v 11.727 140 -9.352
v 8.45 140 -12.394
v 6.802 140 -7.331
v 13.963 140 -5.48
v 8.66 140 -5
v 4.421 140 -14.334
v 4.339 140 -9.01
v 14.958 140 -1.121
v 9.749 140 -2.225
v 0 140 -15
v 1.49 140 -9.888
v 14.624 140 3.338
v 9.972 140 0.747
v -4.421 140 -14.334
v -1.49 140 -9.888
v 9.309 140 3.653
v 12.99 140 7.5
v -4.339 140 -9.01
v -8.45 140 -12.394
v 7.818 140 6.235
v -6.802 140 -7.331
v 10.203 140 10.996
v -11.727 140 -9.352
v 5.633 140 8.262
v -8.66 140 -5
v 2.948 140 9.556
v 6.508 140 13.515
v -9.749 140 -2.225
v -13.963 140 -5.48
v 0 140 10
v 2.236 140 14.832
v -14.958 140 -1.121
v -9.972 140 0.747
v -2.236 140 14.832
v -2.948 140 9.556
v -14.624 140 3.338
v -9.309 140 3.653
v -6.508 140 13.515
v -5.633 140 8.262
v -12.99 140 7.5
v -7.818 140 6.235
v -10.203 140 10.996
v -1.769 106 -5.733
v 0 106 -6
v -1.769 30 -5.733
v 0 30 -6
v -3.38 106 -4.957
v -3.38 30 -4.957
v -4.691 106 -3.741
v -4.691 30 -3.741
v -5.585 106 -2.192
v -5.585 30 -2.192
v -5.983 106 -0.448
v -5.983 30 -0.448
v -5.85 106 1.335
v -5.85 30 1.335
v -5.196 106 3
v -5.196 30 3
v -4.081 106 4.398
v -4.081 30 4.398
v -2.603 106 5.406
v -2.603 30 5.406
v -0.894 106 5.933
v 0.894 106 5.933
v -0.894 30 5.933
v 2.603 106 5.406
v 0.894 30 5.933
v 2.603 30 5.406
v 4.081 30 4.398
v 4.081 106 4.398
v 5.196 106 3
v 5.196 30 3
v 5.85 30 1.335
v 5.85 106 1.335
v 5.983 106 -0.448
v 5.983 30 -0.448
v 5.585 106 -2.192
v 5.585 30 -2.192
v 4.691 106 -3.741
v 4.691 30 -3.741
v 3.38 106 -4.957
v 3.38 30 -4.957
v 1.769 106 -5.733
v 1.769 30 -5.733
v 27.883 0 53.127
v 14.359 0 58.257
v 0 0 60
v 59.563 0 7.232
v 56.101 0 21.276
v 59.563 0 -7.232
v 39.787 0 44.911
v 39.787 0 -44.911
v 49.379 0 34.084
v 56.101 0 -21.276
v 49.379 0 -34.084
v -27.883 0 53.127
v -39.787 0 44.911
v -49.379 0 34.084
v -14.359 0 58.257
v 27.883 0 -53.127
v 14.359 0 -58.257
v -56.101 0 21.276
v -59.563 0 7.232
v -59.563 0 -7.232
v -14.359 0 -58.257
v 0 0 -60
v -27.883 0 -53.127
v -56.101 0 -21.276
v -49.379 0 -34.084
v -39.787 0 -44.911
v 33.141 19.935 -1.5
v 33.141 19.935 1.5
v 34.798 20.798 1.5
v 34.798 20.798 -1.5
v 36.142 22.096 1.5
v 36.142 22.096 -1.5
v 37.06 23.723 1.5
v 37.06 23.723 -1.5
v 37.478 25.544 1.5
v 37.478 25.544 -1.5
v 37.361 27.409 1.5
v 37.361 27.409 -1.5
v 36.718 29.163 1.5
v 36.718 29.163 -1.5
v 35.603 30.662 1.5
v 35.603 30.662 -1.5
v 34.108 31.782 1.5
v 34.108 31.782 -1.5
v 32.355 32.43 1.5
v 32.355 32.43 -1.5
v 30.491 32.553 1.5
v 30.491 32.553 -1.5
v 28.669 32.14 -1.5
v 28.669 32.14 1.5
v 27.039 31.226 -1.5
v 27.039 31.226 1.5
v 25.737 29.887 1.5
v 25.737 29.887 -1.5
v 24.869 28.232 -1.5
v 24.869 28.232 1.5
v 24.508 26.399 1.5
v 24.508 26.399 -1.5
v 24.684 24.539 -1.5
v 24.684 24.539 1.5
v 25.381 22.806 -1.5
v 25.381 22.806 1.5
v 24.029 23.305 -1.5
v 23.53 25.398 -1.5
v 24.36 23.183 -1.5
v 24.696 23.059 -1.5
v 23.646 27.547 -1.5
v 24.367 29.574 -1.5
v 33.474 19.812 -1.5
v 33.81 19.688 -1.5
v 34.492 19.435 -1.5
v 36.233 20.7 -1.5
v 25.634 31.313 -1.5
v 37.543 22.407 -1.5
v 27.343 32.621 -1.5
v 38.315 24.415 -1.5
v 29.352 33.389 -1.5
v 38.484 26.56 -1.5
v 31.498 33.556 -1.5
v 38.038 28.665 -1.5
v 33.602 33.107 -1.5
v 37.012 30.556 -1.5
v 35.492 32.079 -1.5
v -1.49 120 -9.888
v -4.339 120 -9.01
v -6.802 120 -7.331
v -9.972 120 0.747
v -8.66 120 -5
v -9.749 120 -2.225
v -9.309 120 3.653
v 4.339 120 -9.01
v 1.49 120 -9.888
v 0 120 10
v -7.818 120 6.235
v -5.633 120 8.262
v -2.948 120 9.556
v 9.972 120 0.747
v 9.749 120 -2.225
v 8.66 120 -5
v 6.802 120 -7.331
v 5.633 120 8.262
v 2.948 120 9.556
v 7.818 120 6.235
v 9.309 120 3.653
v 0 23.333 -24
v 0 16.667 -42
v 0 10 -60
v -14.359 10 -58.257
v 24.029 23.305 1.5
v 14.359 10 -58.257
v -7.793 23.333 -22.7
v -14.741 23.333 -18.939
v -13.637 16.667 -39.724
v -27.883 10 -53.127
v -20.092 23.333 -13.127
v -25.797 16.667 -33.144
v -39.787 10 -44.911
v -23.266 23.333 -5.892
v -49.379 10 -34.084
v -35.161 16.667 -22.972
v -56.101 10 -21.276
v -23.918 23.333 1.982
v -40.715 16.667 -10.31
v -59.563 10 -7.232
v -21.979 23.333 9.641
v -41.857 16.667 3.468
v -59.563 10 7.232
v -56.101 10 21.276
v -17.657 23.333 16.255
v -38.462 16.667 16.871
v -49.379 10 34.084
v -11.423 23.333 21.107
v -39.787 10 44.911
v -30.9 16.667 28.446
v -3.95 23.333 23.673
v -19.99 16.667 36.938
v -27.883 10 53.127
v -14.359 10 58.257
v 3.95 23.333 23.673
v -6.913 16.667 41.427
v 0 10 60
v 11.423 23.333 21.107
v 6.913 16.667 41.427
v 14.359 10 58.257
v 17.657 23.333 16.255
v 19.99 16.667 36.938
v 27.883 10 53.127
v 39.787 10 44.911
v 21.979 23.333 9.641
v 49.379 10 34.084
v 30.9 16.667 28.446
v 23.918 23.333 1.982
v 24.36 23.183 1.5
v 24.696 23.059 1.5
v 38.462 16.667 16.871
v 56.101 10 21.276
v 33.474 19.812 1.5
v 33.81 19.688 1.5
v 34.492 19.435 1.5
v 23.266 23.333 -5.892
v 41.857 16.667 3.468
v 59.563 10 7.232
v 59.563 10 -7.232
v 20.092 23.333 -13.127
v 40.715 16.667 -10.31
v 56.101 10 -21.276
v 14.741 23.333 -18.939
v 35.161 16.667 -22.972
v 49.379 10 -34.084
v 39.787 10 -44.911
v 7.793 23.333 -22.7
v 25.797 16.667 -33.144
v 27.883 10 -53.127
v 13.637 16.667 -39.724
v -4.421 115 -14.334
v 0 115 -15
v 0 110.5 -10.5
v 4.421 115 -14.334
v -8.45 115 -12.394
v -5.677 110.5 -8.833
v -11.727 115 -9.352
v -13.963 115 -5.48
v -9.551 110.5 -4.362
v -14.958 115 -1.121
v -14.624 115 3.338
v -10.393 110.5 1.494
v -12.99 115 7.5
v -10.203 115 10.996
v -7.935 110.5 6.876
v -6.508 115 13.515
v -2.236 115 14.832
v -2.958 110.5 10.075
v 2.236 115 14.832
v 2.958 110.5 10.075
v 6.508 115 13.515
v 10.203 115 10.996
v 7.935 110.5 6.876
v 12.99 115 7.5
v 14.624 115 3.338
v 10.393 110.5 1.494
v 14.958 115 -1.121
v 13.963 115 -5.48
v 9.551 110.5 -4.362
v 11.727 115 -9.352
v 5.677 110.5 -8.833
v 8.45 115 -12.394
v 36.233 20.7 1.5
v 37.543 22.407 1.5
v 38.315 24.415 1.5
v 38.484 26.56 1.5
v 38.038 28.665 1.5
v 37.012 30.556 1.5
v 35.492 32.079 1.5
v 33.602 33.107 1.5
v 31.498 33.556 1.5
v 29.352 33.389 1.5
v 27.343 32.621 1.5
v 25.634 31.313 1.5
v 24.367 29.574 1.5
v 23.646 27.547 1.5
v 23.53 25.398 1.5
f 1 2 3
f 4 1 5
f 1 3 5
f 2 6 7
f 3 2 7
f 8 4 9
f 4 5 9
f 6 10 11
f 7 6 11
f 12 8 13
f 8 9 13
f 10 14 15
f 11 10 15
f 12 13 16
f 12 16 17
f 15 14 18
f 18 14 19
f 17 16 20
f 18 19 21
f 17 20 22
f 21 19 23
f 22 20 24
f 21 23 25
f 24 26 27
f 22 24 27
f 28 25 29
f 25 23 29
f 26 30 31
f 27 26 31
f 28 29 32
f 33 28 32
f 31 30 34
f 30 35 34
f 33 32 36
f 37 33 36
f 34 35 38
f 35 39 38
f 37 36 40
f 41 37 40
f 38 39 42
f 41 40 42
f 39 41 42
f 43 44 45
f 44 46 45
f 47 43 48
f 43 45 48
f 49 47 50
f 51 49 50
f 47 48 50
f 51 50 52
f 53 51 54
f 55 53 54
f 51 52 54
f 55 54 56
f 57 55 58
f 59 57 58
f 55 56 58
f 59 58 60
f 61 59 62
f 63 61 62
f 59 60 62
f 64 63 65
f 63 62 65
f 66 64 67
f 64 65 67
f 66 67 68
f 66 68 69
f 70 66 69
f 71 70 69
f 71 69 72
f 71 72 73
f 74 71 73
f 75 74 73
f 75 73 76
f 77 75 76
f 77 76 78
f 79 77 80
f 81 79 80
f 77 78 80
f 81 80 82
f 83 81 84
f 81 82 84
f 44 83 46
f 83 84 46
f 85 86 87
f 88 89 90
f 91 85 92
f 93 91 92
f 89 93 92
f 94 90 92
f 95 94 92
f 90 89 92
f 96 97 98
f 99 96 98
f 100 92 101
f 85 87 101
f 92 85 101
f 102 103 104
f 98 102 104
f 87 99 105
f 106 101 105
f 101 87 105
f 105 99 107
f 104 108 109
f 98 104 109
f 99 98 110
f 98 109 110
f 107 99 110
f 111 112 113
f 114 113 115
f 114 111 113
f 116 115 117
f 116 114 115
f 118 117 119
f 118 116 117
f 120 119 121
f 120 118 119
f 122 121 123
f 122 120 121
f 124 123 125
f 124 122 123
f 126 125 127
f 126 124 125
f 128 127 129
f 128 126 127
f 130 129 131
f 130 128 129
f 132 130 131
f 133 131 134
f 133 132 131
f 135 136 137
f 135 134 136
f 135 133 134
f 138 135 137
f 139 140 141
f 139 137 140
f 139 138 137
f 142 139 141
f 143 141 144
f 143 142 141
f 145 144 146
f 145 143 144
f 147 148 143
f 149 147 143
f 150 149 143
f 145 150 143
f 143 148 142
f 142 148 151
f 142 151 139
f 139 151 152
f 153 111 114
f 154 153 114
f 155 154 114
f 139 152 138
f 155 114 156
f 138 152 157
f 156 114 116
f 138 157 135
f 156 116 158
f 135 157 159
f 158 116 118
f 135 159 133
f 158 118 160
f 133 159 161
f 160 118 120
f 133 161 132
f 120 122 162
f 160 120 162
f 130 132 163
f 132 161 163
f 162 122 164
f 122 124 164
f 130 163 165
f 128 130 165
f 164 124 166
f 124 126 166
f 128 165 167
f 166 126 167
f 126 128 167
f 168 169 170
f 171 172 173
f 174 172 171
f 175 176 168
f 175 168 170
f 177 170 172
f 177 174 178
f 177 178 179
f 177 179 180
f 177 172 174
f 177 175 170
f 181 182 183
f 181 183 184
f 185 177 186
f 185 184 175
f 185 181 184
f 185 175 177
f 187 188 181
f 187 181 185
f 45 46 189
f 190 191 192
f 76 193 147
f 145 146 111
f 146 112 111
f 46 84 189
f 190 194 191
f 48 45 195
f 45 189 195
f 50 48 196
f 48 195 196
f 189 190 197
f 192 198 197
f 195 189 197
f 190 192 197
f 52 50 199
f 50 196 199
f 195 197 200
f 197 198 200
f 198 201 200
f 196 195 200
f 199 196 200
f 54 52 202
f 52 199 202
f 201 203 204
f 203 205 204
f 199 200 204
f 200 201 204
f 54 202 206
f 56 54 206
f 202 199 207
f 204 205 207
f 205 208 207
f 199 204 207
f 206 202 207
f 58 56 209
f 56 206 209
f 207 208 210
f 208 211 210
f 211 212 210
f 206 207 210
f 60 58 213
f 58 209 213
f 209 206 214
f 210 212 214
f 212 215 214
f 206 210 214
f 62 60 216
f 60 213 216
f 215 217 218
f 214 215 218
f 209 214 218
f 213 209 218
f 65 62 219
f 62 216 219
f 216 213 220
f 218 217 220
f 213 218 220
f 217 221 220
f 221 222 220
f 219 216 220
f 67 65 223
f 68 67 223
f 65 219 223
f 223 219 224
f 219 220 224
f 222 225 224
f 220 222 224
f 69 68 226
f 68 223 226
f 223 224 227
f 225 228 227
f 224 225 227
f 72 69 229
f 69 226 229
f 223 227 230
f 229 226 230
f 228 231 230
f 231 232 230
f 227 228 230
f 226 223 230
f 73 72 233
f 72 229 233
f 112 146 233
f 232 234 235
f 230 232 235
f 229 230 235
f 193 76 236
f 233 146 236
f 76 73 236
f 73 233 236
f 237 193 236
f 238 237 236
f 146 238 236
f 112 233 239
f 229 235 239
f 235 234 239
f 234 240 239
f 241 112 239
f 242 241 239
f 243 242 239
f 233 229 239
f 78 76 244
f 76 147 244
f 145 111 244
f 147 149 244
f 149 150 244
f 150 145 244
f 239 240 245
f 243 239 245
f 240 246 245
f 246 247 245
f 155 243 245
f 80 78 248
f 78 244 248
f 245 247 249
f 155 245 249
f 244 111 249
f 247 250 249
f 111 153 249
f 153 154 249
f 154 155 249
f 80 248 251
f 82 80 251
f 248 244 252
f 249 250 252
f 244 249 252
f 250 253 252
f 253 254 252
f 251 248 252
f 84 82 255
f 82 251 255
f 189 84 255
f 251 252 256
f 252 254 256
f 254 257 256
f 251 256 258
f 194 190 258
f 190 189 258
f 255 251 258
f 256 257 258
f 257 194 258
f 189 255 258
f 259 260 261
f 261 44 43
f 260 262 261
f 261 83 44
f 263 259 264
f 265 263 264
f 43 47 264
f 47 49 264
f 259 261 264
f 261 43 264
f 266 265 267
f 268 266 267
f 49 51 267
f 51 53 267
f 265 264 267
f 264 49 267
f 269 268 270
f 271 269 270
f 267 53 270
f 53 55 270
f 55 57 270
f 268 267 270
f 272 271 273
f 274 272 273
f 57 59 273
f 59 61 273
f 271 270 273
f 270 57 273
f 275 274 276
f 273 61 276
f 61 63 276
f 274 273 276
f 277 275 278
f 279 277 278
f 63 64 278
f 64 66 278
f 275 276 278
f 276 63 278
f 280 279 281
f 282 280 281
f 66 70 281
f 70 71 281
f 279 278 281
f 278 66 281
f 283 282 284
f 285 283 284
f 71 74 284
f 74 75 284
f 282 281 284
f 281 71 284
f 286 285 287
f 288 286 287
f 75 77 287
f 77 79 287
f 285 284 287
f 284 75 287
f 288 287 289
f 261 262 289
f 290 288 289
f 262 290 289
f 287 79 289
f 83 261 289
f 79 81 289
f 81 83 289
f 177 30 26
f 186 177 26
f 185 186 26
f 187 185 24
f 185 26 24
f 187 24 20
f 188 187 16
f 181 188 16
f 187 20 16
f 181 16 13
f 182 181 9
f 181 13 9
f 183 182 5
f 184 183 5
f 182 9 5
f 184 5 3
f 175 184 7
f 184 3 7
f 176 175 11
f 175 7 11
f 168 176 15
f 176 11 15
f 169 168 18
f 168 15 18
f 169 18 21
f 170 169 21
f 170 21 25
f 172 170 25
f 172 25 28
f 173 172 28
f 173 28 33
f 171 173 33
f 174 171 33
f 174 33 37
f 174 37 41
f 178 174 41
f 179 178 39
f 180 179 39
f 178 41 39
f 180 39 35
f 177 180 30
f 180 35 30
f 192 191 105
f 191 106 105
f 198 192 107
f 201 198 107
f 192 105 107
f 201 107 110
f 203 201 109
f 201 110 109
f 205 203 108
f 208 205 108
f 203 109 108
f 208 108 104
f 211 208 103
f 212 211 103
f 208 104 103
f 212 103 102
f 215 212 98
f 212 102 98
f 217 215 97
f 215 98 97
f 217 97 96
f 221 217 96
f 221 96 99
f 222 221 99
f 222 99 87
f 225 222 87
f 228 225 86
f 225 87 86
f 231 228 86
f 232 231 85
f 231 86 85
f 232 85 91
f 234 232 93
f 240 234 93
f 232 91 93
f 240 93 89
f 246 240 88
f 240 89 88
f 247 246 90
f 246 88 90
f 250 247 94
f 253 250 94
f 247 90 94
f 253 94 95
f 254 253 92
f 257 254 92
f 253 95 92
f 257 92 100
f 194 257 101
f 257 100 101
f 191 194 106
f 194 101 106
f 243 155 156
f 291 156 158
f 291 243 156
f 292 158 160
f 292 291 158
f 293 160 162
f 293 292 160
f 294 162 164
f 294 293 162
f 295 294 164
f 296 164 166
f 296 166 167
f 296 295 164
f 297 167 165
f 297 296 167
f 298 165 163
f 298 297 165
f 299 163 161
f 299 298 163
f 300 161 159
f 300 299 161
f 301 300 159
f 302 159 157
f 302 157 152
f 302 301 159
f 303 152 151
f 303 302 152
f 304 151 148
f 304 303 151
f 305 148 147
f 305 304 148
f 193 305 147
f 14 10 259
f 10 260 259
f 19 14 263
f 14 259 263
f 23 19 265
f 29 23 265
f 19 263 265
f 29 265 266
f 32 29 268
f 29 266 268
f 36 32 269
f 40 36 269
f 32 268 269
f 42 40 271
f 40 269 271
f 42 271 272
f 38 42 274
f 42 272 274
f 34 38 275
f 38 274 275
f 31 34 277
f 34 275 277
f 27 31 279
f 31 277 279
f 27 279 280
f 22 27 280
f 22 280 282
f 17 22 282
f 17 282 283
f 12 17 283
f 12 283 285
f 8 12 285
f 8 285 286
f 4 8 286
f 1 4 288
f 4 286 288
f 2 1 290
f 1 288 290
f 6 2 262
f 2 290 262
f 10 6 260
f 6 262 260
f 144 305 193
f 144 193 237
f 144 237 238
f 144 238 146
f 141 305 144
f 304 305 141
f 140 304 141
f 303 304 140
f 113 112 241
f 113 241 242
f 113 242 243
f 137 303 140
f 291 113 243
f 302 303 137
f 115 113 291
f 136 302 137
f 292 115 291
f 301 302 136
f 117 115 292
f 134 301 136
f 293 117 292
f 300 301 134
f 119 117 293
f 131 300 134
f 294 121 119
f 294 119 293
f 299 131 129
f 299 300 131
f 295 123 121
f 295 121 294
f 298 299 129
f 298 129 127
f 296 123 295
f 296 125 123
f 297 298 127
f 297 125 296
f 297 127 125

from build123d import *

# Parameters (mm, degrees)
SKETCH2_R           = 10
CUT_EXTRUDE2_DEPTH  = 20
SKETCH3_R           = 7.5
SKETCH3_R_2         = 6.5
BOSS_EXTRUDE2_DEPTH = 1.5


with BuildPart() as part:
    # Sketch1 → Revolve1 (revolve)
    with BuildSketch(Plane.XY, mode=Mode.PRIVATE) as revolve1_sk:
        Polygon((0, 140), (-15, 140), (-15, 115), (-6, 106), (-6, 30), (-60, 10), (-60, 0), (0, 0), align=None)
    revolve(revolve1_sk.sketch.rotate(Axis((0, 0, 0), (0, 1, 0)), 270), axis=Axis((0, 0, 0), (0, 1, 0)))

    # Sketch2 → Cut-Extrude2 (cut)
    with BuildSketch(Plane(origin=(0, 140, 0), x_dir=(1, 0, 0), z_dir=(0, 1, 0))):
        with Locations(Location((0, 0, 0), (0, 0, 270))):
            Circle(SKETCH2_R)
    extrude(amount=-CUT_EXTRUDE2_DEPTH, mode=Mode.SUBTRACT)

    # Sketch3 → Boss-Extrude2 (add, symmetric)
    with BuildSketch(Plane.XY):
        with Locations((31, 26.072659277)):
            Circle(SKETCH3_R)
        with Locations((31, 26.072659277)):
            Circle(SKETCH3_R_2, mode=Mode.SUBTRACT)
    extrude(amount=BOSS_EXTRUDE2_DEPTH, both=True)


solid = part.part
